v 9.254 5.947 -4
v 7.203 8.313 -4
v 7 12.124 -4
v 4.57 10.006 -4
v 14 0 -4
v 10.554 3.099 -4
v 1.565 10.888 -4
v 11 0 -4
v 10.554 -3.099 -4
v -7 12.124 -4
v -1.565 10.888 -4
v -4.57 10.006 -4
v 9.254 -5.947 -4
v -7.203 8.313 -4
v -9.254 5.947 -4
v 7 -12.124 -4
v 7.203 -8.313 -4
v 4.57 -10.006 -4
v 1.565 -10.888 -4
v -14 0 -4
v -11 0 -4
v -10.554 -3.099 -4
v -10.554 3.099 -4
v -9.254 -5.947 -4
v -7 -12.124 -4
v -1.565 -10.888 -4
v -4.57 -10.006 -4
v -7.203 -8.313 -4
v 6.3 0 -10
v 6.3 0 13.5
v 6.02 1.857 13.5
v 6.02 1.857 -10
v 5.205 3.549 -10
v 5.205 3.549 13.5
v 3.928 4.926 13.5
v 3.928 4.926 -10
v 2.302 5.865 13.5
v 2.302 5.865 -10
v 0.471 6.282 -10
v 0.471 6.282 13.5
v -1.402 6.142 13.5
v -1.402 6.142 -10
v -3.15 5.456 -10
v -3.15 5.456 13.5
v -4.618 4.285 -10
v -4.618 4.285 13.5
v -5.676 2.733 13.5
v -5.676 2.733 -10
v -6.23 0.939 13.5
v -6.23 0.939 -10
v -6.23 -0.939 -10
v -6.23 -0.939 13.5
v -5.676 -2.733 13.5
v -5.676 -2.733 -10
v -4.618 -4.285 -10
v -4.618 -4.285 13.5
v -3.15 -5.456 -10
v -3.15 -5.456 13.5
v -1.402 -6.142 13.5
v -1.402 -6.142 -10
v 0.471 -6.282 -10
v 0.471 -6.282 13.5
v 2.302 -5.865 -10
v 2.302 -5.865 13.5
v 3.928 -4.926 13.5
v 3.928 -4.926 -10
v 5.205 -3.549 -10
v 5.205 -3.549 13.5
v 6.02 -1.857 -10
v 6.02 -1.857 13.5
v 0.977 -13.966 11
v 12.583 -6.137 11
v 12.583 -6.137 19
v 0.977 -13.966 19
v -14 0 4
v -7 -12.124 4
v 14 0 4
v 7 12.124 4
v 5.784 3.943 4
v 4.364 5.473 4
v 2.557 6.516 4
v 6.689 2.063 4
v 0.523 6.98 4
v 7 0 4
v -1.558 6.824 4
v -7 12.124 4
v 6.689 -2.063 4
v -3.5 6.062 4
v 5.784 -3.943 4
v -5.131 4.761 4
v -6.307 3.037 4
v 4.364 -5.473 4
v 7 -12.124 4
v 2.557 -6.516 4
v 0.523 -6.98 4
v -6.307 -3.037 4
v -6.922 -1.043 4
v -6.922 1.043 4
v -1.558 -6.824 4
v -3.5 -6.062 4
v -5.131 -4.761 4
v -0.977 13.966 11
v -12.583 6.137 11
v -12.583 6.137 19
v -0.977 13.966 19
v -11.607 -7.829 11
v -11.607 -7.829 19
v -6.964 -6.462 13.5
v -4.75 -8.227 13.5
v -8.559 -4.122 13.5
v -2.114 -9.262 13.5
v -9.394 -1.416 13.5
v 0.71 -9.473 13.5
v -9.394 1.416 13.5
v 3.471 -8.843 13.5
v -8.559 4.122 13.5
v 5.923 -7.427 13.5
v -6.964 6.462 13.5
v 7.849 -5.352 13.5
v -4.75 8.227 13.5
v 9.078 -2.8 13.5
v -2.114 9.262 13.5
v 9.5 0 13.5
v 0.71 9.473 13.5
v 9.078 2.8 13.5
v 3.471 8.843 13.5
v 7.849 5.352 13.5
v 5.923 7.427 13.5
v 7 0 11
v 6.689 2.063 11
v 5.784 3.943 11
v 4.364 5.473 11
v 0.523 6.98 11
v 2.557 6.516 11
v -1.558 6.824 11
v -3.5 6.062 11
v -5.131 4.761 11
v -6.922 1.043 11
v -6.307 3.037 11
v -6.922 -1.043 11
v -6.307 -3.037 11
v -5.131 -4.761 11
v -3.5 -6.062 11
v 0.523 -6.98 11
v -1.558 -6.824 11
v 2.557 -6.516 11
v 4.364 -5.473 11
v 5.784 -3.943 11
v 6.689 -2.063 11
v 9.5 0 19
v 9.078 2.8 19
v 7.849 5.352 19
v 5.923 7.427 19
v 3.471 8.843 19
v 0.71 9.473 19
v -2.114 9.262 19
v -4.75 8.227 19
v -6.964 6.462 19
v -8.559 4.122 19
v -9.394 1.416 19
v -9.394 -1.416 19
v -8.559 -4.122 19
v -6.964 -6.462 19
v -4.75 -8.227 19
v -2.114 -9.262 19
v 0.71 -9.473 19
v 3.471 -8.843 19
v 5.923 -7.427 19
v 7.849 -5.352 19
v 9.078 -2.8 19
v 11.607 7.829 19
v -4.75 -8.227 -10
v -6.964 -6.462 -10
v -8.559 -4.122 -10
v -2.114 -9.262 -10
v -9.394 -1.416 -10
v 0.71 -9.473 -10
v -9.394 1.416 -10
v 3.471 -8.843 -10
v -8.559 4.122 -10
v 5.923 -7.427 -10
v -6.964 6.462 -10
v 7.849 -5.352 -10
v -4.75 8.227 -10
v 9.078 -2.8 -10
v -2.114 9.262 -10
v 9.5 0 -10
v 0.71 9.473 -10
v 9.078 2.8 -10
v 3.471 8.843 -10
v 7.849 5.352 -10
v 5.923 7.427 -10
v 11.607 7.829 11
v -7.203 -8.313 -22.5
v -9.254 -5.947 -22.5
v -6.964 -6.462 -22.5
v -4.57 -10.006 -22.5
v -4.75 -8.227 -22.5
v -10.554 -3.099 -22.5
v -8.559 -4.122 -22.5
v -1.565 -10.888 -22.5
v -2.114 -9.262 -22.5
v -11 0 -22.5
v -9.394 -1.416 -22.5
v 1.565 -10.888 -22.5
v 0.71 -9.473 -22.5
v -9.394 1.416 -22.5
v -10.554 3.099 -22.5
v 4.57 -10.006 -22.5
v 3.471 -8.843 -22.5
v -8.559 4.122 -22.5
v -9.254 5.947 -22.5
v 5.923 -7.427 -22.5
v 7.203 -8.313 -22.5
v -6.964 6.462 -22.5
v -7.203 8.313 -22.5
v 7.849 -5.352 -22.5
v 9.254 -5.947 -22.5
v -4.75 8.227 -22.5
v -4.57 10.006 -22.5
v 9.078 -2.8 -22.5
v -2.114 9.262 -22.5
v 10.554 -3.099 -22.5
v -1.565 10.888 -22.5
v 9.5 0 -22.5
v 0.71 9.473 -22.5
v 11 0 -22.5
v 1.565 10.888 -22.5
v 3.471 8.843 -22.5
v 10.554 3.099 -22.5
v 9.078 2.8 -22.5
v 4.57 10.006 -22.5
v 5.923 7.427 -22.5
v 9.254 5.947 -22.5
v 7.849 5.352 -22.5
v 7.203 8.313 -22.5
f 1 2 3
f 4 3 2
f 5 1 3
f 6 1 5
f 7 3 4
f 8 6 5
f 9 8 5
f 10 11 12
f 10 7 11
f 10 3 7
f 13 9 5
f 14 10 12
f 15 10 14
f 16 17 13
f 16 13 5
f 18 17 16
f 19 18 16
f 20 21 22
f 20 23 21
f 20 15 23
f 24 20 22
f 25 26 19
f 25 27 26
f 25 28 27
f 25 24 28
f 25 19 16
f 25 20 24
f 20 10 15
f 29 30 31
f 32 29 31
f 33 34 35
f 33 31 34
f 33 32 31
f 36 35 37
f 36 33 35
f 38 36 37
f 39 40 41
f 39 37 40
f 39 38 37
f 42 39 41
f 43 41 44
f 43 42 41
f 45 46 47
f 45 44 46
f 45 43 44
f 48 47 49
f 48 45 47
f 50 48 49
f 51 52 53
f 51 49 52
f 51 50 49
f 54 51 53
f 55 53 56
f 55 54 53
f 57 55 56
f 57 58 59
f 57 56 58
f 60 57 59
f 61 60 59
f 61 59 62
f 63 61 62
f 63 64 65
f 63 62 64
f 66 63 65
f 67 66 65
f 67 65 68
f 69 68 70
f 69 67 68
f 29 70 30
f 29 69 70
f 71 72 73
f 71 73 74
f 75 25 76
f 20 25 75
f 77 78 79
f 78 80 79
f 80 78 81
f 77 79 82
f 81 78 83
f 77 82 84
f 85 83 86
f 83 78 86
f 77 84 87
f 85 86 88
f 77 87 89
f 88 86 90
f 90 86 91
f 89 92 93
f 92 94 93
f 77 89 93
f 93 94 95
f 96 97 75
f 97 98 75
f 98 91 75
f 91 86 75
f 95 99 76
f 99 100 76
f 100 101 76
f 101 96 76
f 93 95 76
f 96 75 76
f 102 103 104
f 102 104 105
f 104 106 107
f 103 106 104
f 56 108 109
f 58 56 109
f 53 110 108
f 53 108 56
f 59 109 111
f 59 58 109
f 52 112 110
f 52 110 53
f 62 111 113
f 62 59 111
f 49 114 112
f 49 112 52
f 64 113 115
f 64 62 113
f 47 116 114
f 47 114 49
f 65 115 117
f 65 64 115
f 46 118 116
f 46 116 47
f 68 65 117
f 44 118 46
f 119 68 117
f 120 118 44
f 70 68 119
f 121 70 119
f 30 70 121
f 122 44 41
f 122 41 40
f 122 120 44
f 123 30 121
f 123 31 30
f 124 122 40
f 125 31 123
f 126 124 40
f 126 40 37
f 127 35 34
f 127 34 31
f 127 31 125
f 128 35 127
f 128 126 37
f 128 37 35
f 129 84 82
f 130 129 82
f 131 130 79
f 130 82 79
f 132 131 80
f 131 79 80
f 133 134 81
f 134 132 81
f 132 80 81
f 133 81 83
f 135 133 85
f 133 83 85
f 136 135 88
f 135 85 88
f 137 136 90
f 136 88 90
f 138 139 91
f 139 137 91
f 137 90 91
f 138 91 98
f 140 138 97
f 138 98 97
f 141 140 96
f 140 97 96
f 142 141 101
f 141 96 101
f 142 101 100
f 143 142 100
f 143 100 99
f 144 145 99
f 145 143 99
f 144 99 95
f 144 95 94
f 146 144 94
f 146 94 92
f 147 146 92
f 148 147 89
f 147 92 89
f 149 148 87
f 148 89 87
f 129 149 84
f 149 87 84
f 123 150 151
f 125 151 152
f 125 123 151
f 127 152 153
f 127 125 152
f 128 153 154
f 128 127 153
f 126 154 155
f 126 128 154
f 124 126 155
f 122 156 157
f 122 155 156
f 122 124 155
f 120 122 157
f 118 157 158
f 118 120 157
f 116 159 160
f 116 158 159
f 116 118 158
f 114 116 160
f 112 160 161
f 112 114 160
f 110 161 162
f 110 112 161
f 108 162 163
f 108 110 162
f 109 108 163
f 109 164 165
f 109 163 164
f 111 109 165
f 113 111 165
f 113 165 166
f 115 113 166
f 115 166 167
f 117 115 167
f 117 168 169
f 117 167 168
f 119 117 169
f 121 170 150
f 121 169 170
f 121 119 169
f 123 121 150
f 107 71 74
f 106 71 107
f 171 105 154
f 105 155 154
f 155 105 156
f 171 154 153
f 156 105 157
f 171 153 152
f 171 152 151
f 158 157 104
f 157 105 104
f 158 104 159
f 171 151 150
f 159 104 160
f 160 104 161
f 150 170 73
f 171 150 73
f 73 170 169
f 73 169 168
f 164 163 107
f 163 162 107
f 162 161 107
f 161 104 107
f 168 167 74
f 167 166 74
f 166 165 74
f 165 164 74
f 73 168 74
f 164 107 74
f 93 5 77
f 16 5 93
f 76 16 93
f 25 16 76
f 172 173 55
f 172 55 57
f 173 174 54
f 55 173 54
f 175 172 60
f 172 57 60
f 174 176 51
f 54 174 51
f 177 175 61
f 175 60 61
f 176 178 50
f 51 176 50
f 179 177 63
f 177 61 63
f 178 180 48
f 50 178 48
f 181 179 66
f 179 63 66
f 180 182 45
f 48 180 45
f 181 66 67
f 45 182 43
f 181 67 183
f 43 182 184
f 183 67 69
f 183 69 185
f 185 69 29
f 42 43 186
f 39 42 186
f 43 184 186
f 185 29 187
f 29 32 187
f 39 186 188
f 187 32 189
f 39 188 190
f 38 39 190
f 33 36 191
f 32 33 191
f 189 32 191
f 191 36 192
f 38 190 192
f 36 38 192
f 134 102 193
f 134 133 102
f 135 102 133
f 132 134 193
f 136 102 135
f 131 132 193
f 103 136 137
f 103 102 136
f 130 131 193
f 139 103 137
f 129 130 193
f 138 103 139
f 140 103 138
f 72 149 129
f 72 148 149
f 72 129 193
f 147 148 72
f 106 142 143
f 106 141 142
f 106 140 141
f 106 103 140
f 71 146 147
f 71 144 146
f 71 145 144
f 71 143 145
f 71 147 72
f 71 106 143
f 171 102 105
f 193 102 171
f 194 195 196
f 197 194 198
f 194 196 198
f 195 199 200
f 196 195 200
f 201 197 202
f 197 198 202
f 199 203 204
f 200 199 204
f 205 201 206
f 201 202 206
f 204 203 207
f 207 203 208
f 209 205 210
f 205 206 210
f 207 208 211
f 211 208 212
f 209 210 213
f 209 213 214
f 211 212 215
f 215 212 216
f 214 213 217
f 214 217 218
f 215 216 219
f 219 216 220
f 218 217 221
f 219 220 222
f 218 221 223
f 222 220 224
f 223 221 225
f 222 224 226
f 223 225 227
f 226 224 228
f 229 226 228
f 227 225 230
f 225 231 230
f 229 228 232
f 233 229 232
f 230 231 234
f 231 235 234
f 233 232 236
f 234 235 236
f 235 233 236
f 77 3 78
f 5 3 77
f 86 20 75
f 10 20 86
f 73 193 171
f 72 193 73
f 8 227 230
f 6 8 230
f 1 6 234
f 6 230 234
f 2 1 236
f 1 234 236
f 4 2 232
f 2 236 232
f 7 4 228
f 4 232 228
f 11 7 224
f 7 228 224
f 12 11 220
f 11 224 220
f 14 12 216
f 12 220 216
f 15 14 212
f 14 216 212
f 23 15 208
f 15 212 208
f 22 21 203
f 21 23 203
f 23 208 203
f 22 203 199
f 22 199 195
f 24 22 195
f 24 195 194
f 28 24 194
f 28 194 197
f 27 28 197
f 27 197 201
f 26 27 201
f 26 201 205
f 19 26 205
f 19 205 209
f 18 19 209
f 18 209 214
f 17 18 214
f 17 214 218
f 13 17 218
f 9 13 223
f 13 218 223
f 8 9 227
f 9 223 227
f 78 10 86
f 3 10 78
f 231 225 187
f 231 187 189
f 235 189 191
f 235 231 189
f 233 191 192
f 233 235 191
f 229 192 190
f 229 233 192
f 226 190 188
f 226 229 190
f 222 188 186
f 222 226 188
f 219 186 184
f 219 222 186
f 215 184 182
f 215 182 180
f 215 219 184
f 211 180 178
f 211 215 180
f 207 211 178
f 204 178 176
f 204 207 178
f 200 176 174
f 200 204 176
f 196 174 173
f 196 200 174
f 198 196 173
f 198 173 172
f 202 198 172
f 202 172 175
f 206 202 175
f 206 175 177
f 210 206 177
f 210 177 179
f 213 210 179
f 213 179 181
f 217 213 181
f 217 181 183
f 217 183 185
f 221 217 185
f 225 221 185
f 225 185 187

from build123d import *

# Parameters (mm, degrees)
CYLINDER008_R                    = 6.3
CYLINDER008_DEPTH                = 50
CYLINDER009_R                    = 9.5
CYLINDER009_DEPTH                = 13
CYLINDER007_R                    = 9.5
CYLINDER007_DEPTH                = 20
CYLINDER006_R                    = 7
CYLINDER006_DEPTH                = 30
LINEAREXTRUDE002_DEPTH           = 8
LINEAREXTRUDE003_DEPTH           = 8
LINEAREXTRUDE003_PLACEMENT_ANGLE = 34
CYLINDER005_R                    = 11
CYLINDER005_DEPTH                = 25
CYLINDER003_R                    = 6.3
CYLINDER003_DEPTH                = 50
CYLINDER004_R                    = 9.5
CYLINDER004_DEPTH                = 13
CYLINDER002_R                    = 9.5
CYLINDER002_DEPTH                = 20
CYLINDER001_R                    = 7
CYLINDER001_DEPTH                = 30
LINEAREXTRUDE_DEPTH              = 8
LINEAREXTRUDE001_DEPTH           = 8
LINEAREXTRUDE001_PLACEMENT_ANGLE = 34
CYLINDER_R                       = 11
CYLINDER_DEPTH                   = 25


with BuildPart() as cylinder008:
    # cylinder008 → cylinder008 (new body)
    with BuildSketch(Plane.XY.offset(-15)):
        Circle(CYLINDER008_R)
    extrude(amount=CYLINDER008_DEPTH)


with BuildPart() as cylinder009:
    # cylinder009 → cylinder009 (new body)
    with BuildSketch(Plane.XY.offset(13.5)):
        Circle(CYLINDER009_R)
    extrude(amount=CYLINDER009_DEPTH)


with BuildPart() as group003:
    # cylinder007 → cylinder007 (new body)
    with BuildSketch(Plane.XY.offset(-30)):
        Circle(CYLINDER007_R)
    extrude(amount=CYLINDER007_DEPTH)

    # Group003: union cylinder008, cylinder009
    add(cylinder008.part)
    add(cylinder009.part)


with BuildPart() as cylinder006:
    # cylinder006 → cylinder006 (new body)
    with BuildSketch(Plane.XY.offset(-15)):
        Circle(CYLINDER006_R)
    extrude(amount=CYLINDER006_DEPTH)


with BuildPart() as linearextrude002:
    # RefineLinearExtrude002 → LinearExtrude002 (new body)
    with BuildSketch(Plane(origin=(0, 0, 0), x_dir=(0, -1, 0), z_dir=(0, 0, -1))):
        Polygon((-12.124356, -7), (0, -14), (12.124356, -7), (12.124356, 7), (0, 14), (-12.124356, 7), align=None)
    extrude(amount=-LINEAREXTRUDE002_DEPTH)


with BuildPart() as linearextrude002_1:
    # LinearExtrude002 placement: moved
    add(linearextrude002.part.moved(Location((0, 0, -4))))


with BuildPart() as linearextrude003:
    # RefineLinearExtrude003 → LinearExtrude003 (new body)
    with BuildSketch(Plane(origin=(0, 0, 0), x_dir=(0, -1, 0), z_dir=(0, 0, -1))):
        Polygon((-12.124356, -7), (0, -14), (12.124356, -7), (12.124356, 7), (0, 14), (-12.124356, 7), align=None)
    extrude(amount=-LINEAREXTRUDE003_DEPTH)


with BuildPart() as linearextrude003_1:
    # LinearExtrude003 placement: moved
    add(linearextrude003.part.moved(Location((0, 0, 11))).rotate(Axis((0, 0, 11), (0, 0, 1)), LINEAREXTRUDE003_PLACEMENT_ANGLE))


with BuildPart() as difference001:
    # cylinder005 → cylinder005 (new body)
    with BuildSketch(Plane.XY.offset(-22.5)):
        Circle(CYLINDER005_R)
    extrude(amount=CYLINDER005_DEPTH)

    # Group002: union cylinder006, LinearExtrude002, LinearExtrude003
    add(cylinder006.part)
    add(linearextrude002_1.part)
    add(linearextrude003_1.part)

    # difference001: cut Group003
    add(group003.part, mode=Mode.SUBTRACT)


with BuildPart() as cylinder003:
    # cylinder003 → cylinder003 (new body)
    with BuildSketch(Plane.XY.offset(-15)):
        Circle(CYLINDER003_R)
    extrude(amount=CYLINDER003_DEPTH)


with BuildPart() as cylinder004:
    # cylinder004 → cylinder004 (new body)
    with BuildSketch(Plane.XY.offset(13.5)):
        Circle(CYLINDER004_R)
    extrude(amount=CYLINDER004_DEPTH)


with BuildPart() as group001:
    # cylinder002 → cylinder002 (new body)
    with BuildSketch(Plane.XY.offset(-30)):
        Circle(CYLINDER002_R)
    extrude(amount=CYLINDER002_DEPTH)

    # Group001: union cylinder003, cylinder004
    add(cylinder003.part)
    add(cylinder004.part)


with BuildPart() as cylinder001:
    # cylinder001 → cylinder001 (new body)
    with BuildSketch(Plane.XY.offset(-15)):
        Circle(CYLINDER001_R)
    extrude(amount=CYLINDER001_DEPTH)


with BuildPart() as linearextrude:
    # RefineLinearExtrude → LinearExtrude (new body)
    with BuildSketch(Plane(origin=(0, 0, 0), x_dir=(0, -1, 0), z_dir=(0, 0, -1))):
        Polygon((-12.124356, -7), (0, -14), (12.124356, -7), (12.124356, 7), (0, 14), (-12.124356, 7), align=None)
    extrude(amount=-LINEAREXTRUDE_DEPTH)


with BuildPart() as linearextrude_1:
    # LinearExtrude placement: moved
    add(linearextrude.part.moved(Location((0, 0, -4))))


with BuildPart() as linearextrude001:
    # RefineLinearExtrude001 → LinearExtrude001 (new body)
    with BuildSketch(Plane(origin=(0, 0, 0), x_dir=(0, -1, 0), z_dir=(0, 0, -1))):
        Polygon((-12.124356, -7), (0, -14), (12.124356, -7), (12.124356, 7), (0, 14), (-12.124356, 7), align=None)
    extrude(amount=-LINEAREXTRUDE001_DEPTH)


with BuildPart() as linearextrude001_1:
    # LinearExtrude001 placement: moved
    add(linearextrude001.part.moved(Location((0, 0, 11))).rotate(Axis((0, 0, 11), (0, 0, 1)), LINEAREXTRUDE001_PLACEMENT_ANGLE))


with BuildPart() as group004:
    # cylinder → cylinder (new body)
    with BuildSketch(Plane.XY.offset(-22.5)):
        Circle(CYLINDER_R)
    extrude(amount=CYLINDER_DEPTH)

    # Group: union cylinder001, LinearExtrude, LinearExtrude001
    add(cylinder001.part)
    add(linearextrude_1.part)
    add(linearextrude001_1.part)

    # difference: cut Group001
    add(group001.part, mode=Mode.SUBTRACT)

    # Group004: union difference001
    add(difference001.part)


solid = group004.part
